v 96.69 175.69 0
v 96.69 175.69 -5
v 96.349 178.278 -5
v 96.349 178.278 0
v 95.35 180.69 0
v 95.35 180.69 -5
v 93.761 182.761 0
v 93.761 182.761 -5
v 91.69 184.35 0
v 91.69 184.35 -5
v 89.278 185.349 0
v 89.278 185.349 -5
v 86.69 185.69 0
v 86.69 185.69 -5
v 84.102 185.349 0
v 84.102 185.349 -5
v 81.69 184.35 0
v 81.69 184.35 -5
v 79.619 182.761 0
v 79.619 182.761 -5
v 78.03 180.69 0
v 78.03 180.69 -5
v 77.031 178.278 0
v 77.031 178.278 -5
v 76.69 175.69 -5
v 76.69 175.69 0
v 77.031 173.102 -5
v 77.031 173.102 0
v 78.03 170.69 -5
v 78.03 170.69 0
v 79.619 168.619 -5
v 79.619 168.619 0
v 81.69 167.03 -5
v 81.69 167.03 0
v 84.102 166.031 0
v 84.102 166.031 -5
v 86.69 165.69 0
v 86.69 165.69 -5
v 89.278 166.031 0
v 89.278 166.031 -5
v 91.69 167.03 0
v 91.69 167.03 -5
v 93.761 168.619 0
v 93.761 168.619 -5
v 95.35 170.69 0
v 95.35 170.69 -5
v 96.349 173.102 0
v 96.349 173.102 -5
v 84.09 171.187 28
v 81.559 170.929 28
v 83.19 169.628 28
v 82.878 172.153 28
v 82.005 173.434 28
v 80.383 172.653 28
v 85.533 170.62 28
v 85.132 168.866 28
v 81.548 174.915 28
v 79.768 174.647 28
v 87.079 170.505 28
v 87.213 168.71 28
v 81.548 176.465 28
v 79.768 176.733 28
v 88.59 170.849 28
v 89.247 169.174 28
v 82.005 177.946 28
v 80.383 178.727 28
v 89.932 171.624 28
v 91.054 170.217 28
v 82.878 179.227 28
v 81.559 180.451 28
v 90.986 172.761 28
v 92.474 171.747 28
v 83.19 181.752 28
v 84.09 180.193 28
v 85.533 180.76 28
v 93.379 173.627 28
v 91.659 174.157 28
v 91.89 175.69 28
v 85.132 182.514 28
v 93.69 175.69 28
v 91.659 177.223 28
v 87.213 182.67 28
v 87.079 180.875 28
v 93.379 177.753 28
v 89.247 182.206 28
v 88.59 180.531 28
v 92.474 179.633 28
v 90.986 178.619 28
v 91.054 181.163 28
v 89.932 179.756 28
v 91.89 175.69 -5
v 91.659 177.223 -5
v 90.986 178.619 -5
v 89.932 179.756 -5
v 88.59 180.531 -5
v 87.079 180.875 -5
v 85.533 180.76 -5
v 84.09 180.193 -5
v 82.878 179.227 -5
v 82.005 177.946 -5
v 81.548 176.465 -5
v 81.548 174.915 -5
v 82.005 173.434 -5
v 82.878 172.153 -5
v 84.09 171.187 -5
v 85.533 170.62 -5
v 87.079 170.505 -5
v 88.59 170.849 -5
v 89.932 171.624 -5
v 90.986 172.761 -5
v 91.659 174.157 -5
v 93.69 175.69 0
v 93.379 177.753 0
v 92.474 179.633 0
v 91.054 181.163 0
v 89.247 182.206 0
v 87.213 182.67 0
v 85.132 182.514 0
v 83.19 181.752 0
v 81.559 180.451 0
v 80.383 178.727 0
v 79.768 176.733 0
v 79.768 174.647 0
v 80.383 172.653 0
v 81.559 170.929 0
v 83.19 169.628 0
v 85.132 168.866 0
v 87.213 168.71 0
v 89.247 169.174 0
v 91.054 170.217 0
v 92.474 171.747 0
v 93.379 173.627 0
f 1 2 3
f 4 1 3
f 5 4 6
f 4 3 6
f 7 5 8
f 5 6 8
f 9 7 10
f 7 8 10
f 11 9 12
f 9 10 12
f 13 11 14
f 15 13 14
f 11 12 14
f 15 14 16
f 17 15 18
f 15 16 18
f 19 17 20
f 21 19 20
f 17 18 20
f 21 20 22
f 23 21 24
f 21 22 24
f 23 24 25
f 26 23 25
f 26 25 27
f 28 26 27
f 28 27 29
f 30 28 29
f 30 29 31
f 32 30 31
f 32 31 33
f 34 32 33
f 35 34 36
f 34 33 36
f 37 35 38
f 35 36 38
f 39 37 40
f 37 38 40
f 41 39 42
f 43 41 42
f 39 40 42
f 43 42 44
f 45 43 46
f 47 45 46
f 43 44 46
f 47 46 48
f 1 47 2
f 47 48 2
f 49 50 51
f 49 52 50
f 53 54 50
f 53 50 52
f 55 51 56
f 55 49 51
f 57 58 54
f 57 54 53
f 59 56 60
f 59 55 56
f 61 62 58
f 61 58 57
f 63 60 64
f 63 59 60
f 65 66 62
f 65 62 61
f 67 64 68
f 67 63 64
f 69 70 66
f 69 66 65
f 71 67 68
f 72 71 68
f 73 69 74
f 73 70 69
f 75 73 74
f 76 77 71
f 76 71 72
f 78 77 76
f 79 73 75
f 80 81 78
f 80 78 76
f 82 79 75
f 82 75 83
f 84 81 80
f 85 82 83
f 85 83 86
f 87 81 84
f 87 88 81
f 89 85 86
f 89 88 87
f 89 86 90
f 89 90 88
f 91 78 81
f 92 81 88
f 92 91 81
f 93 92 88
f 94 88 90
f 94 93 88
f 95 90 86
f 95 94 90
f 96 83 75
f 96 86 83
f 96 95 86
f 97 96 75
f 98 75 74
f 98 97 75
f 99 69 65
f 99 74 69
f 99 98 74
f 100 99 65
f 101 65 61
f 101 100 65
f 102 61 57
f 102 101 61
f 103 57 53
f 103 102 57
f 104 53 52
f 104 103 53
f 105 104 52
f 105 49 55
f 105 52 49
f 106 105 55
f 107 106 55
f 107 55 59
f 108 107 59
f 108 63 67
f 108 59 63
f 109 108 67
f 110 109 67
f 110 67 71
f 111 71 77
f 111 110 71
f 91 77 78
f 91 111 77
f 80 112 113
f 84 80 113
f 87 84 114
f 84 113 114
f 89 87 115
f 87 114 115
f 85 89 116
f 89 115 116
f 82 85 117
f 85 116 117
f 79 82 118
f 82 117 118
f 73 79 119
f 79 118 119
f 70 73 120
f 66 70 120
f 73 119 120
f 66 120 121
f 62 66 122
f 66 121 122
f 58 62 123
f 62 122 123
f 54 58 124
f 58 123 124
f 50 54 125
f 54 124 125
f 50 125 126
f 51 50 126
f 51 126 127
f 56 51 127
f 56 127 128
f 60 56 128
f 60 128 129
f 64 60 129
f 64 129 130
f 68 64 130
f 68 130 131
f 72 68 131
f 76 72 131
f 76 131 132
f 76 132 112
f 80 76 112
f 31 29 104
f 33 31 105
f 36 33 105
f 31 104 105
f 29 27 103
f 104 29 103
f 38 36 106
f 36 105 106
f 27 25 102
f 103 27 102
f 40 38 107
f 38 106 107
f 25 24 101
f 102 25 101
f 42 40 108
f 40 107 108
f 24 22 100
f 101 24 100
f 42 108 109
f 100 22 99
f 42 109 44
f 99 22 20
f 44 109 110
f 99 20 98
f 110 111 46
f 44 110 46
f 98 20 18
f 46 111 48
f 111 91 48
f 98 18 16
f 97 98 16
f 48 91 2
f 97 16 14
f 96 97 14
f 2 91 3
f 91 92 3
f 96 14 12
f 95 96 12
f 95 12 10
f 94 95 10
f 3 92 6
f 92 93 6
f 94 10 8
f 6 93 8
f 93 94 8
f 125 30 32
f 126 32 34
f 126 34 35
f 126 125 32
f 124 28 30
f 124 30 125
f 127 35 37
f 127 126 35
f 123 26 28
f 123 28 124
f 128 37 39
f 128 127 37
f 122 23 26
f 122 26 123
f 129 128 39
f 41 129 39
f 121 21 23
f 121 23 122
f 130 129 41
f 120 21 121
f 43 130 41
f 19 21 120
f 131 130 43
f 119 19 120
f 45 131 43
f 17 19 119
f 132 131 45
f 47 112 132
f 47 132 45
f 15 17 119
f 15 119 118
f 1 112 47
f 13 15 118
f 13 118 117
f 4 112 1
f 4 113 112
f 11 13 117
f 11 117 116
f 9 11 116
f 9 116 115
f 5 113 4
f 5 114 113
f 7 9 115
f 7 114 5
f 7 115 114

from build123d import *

# Parameters (mm, degrees)
CYLINDER110_R     = 1.5
CYLINDER110_DEPTH = 11
CYLINDER104_R     = 5.2
CYLINDER104_DEPTH = 46
CYLINDER109_R     = 1.5
CYLINDER109_DEPTH = 11
BOX018_W          = 14
BOX018_H          = 1
BOX018_DEPTH      = 5
CYLINDER102_R     = 10
CYLINDER102_DEPTH = 5
CYLINDER071_R     = 7
CYLINDER071_DEPTH = 33


with BuildPart() as ftthreaded006:
    # Cylinder110 → Cylinder110 (new body)
    with BuildSketch(Plane(origin=(99.69, 175.69, -10), x_dir=(1, 0, 0), z_dir=(0, 0, 1))):
        Circle(CYLINDER110_R)
    extrude(amount=CYLINDER110_DEPTH)


with BuildPart() as rffeeds006:
    # Cylinder104 → Cylinder104 (new body)
    with BuildSketch(Plane(origin=(86.69, 175.69, -14), x_dir=(1, 0, 0), z_dir=(0, 0, 1))):
        Circle(CYLINDER104_R)
    extrude(amount=CYLINDER104_DEPTH)


with BuildPart() as fusion046:
    # Cylinder109 → Cylinder109 (new body)
    with BuildSketch(Plane(origin=(73.69, 175.69, -10), x_dir=(1, 0, 0), z_dir=(0, 0, 1))):
        Circle(CYLINDER109_R)
    extrude(amount=CYLINDER109_DEPTH)

    # Fusion046: union FTThreaded006, RFFeeds006
    add(ftthreaded006.part)
    add(rffeeds006.part)


with BuildPart() as rffeedlug:
    # Box018 → Box018 (new body)
    with BuildSketch(Plane(origin=(77.69, 171.69, -5), x_dir=(1, 0, 0), z_dir=(0, 0, 1))):
        with Locations((7, 0.5)):
            Rectangle(BOX018_W, BOX018_H)
    extrude(amount=BOX018_DEPTH)


with BuildPart() as rffeeds005:
    # Cylinder102 → Cylinder102 (new body)
    with BuildSketch(Plane(origin=(86.69, 175.69, -5), x_dir=(1, 0, 0), z_dir=(0, 0, 1))):
        Circle(CYLINDER102_R)
    extrude(amount=CYLINDER102_DEPTH)


with BuildPart() as rfftinsulator1:
    # Cylinder071 → Cylinder071 (new body)
    with BuildSketch(Plane(origin=(86.69, 175.69, -5), x_dir=(1, 0, 0), z_dir=(0, 0, 1))):
        Circle(CYLINDER071_R)
    extrude(amount=CYLINDER071_DEPTH)

    # Fusion045: union RFFeedLug, RFFeeds005
    add(rffeedlug.part)
    add(rffeeds005.part)

    # Cut013: cut Fusion046
    add(fusion046.part, mode=Mode.SUBTRACT)


solid = rfftinsulator1.part
